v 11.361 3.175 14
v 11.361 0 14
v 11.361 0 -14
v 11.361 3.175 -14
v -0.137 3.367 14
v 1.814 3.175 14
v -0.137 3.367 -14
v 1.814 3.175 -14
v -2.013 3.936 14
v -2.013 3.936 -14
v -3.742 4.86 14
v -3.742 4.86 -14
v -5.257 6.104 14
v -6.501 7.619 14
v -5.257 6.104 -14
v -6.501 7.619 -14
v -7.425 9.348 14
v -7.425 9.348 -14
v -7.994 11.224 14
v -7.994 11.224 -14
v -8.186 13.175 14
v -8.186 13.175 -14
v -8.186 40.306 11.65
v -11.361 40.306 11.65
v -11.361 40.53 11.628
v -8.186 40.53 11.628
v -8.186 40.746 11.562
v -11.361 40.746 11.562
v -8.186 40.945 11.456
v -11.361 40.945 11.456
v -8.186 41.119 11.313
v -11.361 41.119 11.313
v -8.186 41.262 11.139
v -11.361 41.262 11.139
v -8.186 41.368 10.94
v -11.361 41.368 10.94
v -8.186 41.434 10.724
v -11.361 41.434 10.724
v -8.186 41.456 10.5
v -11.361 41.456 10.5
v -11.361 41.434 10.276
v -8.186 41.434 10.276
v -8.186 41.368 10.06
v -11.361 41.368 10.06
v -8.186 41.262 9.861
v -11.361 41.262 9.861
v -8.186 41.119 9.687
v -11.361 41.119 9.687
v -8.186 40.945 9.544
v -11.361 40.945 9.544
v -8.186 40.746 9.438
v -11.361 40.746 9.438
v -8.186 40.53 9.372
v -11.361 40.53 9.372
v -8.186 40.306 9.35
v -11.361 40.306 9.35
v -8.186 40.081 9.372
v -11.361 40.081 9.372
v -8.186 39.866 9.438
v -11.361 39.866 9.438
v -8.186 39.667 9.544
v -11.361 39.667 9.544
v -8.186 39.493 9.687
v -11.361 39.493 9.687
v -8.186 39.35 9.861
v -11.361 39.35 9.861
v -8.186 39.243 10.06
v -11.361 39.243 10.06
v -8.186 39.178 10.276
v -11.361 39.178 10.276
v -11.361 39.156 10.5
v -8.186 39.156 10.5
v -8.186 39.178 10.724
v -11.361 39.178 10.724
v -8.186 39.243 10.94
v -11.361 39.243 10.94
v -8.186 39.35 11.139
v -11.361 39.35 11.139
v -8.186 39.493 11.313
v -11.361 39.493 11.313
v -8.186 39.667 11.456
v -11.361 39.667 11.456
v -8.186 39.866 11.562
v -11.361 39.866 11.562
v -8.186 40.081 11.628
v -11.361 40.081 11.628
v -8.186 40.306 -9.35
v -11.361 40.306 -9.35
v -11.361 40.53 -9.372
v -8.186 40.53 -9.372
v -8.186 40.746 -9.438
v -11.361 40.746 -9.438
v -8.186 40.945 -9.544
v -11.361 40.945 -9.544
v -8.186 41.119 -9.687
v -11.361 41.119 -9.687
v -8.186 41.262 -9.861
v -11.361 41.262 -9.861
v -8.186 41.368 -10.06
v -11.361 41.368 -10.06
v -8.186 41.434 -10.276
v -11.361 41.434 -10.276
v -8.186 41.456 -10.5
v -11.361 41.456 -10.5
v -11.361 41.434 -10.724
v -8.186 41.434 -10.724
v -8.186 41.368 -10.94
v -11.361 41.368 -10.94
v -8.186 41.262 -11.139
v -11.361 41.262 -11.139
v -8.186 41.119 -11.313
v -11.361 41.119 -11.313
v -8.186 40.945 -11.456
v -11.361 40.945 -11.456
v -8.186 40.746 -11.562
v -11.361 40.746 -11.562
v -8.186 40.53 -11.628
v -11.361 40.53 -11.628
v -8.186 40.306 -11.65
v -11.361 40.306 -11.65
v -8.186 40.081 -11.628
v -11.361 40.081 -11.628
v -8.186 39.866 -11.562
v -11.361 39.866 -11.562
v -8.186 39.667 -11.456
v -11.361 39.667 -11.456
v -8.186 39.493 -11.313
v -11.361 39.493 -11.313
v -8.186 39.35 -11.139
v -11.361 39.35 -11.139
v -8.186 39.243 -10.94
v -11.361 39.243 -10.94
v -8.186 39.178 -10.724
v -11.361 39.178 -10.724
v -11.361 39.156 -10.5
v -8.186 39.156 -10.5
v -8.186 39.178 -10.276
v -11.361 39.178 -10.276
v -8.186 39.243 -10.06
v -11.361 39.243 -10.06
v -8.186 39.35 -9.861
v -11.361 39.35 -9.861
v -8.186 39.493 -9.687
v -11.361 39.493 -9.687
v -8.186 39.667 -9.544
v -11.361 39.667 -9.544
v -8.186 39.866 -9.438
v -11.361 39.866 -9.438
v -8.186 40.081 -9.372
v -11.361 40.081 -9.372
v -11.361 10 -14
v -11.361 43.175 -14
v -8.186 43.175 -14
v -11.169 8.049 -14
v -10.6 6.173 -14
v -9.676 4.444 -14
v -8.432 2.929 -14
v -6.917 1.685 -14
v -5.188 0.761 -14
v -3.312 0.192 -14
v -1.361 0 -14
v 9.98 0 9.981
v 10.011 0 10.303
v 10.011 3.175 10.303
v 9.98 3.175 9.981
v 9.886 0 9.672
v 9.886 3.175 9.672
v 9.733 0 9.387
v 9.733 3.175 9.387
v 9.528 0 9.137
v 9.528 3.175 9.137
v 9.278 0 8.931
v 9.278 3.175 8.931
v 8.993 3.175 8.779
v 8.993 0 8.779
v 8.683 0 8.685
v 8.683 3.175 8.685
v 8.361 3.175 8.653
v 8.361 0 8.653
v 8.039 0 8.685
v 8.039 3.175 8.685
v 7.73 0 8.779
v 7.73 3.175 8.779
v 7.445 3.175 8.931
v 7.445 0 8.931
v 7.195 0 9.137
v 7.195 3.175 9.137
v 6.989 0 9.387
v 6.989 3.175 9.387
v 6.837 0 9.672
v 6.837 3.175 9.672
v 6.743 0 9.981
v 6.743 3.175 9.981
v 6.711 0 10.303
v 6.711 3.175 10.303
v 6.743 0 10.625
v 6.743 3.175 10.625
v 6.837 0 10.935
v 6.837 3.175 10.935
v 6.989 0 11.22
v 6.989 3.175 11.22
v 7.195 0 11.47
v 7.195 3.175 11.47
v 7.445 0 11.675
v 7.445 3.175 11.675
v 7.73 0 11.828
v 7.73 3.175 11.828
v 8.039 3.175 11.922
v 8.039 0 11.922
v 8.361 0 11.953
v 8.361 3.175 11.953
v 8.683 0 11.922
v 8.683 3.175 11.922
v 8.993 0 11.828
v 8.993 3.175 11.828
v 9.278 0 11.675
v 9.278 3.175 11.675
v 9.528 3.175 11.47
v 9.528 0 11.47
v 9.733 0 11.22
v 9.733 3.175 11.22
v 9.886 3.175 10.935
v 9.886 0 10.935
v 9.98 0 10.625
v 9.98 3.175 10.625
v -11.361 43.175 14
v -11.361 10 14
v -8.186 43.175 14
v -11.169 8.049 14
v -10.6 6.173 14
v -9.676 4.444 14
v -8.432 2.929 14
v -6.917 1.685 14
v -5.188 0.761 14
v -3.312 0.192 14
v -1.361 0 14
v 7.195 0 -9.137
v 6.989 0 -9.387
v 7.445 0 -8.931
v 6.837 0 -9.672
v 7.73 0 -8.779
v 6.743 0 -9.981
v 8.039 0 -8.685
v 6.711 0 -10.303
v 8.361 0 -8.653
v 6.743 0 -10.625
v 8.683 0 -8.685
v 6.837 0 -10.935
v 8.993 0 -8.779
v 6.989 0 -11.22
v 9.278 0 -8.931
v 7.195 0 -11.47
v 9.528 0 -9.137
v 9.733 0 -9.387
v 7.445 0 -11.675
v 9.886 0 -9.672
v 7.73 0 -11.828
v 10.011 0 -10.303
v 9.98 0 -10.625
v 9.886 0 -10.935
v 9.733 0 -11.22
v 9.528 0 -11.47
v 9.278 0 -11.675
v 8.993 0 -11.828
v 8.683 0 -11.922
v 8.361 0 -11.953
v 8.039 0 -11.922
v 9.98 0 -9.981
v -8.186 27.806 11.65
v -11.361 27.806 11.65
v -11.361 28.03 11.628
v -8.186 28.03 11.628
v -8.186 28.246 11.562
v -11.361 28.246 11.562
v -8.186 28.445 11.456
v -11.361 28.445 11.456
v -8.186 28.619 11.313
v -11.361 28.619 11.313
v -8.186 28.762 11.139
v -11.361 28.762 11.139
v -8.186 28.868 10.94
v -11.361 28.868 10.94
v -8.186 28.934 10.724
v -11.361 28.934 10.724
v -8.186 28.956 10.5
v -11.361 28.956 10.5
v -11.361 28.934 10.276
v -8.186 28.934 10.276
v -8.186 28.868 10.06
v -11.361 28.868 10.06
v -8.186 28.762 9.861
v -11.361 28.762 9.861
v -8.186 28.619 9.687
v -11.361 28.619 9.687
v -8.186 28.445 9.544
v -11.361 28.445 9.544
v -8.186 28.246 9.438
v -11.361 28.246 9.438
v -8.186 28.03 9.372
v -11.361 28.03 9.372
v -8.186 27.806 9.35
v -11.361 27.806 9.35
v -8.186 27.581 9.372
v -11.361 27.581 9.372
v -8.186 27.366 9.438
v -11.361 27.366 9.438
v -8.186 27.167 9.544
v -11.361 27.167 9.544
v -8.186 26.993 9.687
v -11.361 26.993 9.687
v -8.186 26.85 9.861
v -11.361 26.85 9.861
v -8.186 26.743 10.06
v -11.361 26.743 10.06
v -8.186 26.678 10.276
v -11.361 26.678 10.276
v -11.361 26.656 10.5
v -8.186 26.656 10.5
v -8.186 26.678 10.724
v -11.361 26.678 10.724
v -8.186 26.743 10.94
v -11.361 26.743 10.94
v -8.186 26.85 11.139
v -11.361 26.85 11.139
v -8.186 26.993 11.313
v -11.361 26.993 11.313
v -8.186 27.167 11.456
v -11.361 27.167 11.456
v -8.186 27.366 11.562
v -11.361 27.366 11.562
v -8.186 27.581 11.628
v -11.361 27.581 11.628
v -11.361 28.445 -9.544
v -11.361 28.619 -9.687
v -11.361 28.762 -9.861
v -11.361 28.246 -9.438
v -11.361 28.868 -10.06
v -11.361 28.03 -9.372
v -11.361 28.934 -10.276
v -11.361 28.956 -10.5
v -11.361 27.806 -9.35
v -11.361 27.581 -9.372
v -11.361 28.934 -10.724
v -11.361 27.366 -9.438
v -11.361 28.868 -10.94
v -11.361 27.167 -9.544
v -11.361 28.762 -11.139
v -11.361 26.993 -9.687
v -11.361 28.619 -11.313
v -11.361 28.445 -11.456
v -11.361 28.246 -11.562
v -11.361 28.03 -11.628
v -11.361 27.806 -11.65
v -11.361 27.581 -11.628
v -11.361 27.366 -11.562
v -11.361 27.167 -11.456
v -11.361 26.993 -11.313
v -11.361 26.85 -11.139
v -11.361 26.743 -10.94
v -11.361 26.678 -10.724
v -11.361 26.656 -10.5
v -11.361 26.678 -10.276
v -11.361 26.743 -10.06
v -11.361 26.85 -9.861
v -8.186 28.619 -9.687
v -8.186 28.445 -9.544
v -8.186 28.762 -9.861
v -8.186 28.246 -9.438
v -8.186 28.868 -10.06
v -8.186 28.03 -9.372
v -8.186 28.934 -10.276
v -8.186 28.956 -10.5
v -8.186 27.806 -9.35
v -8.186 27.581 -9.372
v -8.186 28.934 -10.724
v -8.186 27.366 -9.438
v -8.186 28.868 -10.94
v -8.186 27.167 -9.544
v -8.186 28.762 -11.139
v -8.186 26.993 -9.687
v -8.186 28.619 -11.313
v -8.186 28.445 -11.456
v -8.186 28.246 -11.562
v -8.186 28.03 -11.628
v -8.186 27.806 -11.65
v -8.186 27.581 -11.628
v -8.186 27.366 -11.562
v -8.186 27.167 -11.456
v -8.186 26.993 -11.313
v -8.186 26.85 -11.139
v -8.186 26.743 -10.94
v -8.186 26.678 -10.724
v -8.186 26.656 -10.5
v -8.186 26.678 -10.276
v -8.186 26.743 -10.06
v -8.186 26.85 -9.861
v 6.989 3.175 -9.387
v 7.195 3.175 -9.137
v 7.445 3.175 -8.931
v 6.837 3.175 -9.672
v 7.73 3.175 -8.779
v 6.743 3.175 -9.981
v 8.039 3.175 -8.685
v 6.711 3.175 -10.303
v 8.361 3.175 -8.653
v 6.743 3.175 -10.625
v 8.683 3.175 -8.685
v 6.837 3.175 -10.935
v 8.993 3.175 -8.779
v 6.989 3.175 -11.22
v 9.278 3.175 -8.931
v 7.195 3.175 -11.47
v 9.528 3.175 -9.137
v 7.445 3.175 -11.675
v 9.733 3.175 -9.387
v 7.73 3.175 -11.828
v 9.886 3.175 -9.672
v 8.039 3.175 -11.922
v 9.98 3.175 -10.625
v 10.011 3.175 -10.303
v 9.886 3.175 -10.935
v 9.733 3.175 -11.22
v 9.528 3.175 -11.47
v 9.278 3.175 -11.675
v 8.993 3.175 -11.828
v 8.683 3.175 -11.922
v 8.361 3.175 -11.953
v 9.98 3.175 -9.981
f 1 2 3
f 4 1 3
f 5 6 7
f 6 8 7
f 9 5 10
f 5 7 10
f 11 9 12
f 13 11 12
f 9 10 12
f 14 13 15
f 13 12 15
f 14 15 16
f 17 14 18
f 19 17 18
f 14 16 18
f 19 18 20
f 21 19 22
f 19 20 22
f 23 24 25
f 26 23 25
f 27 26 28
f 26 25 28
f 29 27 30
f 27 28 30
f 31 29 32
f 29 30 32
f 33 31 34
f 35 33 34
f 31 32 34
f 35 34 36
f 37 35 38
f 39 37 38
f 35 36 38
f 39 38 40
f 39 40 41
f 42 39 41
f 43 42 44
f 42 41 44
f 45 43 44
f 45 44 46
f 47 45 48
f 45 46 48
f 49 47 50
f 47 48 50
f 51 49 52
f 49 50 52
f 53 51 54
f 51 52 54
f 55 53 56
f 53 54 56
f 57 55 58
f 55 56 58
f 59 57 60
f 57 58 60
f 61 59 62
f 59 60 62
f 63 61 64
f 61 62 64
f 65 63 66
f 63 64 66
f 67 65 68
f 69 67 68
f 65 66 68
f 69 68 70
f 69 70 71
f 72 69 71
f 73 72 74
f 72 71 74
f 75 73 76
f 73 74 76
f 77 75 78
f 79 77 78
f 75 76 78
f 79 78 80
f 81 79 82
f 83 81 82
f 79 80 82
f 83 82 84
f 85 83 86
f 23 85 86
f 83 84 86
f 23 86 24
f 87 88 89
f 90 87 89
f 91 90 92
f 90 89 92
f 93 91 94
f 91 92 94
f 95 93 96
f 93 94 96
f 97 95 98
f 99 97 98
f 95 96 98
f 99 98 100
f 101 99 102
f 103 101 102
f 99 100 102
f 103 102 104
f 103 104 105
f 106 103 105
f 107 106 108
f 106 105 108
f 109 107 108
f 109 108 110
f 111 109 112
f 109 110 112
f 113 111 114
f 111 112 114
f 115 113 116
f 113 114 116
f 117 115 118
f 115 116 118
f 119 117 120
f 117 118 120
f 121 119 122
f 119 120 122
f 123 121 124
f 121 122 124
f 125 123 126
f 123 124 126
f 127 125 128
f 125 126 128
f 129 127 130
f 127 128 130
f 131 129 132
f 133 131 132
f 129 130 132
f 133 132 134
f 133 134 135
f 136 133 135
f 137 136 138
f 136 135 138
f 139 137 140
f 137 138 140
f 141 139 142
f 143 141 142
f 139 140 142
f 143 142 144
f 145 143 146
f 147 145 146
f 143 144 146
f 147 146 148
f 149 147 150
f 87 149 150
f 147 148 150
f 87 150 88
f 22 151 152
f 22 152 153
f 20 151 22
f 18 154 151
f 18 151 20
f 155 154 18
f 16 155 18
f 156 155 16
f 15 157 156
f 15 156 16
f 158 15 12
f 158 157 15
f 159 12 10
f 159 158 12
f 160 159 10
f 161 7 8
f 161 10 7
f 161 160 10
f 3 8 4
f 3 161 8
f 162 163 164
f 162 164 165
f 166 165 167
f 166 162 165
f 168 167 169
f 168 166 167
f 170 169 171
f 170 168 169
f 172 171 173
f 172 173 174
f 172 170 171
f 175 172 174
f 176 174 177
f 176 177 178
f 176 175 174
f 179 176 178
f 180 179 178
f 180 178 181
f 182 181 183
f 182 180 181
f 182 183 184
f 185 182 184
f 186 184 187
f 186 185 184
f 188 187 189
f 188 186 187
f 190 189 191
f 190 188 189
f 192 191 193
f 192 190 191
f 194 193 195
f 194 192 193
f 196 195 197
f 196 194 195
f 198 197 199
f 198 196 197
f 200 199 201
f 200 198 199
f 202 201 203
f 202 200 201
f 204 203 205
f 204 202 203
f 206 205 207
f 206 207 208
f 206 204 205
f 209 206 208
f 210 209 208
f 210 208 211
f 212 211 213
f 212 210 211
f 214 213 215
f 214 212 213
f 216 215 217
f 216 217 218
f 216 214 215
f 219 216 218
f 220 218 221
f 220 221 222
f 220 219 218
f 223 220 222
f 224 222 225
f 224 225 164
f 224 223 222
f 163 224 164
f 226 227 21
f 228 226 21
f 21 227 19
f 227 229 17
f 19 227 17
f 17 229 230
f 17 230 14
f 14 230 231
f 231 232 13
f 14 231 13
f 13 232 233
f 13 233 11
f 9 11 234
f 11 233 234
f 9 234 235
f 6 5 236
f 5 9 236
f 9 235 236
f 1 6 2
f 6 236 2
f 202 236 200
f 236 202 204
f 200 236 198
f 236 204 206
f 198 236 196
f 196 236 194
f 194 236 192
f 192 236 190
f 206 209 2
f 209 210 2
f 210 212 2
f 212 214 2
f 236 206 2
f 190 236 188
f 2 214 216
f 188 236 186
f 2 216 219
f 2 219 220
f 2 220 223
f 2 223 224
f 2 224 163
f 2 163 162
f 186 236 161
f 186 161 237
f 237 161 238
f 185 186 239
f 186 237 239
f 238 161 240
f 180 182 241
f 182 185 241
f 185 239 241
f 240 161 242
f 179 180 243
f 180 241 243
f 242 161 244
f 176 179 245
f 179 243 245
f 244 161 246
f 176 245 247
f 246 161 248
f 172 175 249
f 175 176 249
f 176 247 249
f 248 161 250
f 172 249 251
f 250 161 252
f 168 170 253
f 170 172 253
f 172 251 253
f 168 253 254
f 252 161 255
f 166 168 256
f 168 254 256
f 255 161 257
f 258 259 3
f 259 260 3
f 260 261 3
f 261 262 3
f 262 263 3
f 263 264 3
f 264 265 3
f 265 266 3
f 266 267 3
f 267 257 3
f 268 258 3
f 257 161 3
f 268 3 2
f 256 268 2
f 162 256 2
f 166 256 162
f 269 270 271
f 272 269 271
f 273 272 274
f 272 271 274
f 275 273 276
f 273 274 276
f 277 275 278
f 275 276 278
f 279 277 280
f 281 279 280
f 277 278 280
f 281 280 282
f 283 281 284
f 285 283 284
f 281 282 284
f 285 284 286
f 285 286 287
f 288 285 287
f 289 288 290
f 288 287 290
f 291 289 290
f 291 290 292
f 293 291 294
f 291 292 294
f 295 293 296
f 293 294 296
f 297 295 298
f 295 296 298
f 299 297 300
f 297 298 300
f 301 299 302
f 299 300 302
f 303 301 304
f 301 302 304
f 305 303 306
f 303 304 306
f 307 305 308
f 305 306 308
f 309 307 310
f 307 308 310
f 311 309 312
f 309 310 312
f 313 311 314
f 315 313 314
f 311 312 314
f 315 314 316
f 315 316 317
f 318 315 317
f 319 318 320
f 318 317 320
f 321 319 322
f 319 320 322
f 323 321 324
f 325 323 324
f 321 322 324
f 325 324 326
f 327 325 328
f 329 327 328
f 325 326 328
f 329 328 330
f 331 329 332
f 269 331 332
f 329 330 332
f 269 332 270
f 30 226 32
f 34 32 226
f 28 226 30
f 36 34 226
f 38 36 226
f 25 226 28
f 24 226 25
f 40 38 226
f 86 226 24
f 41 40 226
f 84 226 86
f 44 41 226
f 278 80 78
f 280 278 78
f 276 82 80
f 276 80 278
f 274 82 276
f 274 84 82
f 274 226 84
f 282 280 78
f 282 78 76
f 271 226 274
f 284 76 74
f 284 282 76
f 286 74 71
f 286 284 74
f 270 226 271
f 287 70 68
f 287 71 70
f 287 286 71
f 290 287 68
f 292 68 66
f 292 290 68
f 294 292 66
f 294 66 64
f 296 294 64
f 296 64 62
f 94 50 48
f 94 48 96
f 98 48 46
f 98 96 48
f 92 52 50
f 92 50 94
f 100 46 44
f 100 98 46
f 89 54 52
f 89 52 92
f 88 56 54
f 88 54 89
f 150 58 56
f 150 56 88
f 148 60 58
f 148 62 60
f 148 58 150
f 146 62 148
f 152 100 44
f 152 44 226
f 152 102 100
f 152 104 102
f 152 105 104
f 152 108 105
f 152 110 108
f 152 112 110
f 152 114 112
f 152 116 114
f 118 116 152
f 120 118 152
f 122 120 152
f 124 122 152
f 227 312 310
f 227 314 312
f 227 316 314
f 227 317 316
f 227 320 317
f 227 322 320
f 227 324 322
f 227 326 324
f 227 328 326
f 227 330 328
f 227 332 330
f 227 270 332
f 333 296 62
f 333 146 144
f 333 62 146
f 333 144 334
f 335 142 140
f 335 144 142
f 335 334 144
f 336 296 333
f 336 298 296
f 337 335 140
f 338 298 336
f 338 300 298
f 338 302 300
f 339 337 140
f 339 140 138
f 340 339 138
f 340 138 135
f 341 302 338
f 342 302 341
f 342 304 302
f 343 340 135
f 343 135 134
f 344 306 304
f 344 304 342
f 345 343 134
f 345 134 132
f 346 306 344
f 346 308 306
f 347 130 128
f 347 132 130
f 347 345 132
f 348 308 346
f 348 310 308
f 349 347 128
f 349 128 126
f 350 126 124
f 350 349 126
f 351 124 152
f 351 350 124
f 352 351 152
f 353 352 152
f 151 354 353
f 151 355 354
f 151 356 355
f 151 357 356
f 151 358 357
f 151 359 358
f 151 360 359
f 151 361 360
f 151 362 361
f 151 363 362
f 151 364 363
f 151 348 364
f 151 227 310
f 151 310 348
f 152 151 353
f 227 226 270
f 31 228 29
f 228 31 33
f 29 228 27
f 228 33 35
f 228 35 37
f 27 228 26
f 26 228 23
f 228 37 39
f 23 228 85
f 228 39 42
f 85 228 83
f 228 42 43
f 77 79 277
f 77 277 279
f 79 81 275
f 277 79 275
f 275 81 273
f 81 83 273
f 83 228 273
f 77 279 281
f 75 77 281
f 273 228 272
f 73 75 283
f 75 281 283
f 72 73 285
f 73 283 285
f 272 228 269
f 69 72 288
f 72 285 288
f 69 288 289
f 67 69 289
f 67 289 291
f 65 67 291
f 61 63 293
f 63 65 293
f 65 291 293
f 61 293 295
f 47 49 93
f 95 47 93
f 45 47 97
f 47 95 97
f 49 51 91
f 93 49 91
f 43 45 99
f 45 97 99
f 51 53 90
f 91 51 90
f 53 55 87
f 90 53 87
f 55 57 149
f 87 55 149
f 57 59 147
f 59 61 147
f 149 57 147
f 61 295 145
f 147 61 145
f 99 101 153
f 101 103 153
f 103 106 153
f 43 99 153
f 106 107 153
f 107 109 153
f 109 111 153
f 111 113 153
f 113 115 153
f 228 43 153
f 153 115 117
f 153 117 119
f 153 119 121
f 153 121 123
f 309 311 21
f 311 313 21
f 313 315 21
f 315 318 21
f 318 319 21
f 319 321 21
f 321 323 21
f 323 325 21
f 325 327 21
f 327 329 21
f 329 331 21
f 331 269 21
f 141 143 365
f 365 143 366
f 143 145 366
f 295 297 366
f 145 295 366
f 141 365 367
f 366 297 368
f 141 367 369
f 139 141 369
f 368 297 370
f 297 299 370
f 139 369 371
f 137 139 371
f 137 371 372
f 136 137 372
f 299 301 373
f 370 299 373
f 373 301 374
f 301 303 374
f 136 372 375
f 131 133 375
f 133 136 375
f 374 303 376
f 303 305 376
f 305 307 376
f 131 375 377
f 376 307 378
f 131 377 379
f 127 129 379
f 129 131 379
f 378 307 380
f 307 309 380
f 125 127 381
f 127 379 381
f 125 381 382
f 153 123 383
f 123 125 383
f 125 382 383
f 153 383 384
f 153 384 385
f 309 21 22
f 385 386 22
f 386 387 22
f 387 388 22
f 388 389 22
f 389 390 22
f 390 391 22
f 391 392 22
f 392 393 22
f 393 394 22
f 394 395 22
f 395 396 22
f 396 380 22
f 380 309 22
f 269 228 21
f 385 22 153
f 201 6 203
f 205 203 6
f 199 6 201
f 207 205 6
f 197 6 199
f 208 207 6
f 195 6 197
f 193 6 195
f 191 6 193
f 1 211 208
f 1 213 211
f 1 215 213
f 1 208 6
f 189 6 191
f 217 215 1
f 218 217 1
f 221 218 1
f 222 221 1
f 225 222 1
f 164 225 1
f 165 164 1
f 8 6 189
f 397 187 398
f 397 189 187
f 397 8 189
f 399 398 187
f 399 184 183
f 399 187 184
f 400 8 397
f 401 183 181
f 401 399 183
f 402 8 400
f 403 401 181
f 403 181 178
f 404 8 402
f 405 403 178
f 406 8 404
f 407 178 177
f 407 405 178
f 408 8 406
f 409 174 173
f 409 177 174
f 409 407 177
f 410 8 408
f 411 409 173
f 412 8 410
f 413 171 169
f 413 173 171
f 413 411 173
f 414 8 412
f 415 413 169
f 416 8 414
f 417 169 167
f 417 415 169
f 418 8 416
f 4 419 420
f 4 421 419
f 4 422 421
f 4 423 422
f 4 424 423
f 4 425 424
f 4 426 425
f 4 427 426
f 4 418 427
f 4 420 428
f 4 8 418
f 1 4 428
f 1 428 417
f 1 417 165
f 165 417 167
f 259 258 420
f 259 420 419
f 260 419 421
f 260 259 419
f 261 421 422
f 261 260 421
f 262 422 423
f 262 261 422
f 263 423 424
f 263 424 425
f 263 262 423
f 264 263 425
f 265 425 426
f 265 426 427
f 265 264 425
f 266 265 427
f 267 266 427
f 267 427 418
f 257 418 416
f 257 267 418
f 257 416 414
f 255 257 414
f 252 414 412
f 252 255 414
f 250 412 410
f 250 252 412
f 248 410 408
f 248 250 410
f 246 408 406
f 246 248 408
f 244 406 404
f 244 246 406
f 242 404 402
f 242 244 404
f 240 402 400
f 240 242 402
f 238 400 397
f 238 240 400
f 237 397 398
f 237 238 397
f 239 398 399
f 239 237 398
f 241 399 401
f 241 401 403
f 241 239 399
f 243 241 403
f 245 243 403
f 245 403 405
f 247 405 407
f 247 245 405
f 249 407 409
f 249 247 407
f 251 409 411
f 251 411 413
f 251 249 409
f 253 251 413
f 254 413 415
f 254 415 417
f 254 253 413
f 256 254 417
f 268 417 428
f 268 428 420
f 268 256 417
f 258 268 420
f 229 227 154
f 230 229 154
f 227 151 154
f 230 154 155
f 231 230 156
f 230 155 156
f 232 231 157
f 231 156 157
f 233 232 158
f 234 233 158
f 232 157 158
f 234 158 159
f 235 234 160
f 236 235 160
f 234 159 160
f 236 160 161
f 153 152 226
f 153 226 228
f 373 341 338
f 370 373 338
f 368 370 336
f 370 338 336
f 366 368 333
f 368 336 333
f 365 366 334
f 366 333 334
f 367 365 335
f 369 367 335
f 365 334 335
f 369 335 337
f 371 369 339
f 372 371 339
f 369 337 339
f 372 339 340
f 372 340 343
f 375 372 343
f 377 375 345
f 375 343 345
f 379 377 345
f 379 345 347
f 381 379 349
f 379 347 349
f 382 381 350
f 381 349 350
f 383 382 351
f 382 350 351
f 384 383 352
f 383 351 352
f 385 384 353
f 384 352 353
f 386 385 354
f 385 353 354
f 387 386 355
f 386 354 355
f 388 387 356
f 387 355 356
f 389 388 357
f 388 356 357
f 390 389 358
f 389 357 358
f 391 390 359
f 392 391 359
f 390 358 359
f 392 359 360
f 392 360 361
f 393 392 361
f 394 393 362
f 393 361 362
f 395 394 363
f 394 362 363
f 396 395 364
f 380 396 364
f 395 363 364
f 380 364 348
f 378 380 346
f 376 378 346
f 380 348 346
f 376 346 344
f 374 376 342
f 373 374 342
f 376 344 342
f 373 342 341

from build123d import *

# Parameters (mm, degrees)
SKETCH1_W           = 22.722789772
SKETCH1_H           = 28
SKETCH1_R           = 1.65
BOSS_EXTRUDE1_DEPTH = 3.175
SKETCH2_W           = 3.175
SKETCH2_H           = 28
BOSS_EXTRUDE2_DEPTH = 40
FILLET1_R           = 10
SKETCH3_R           = 1.15
CUT_EXTRUDE1_DEPTH  = 3.175


with BuildPart() as part:
    # Sketch1 → Boss-Extrude1 (new body)
    with BuildSketch(Plane(origin=(0, 0, 0), x_dir=(1, 0, 0), z_dir=(0, 1, 0))):
        Rectangle(SKETCH1_W, SKETCH1_H)
        with Locations((8.361394886, 10.30327082)):
            Circle(SKETCH1_R, mode=Mode.SUBTRACT)
        with Locations((8.361394886, -10.30327082)):
            Circle(SKETCH1_R, mode=Mode.SUBTRACT)
    extrude(amount=BOSS_EXTRUDE1_DEPTH)

    # Sketch2 → Boss-Extrude2 (add)
    with BuildSketch(Plane(origin=(0, 3.175, 0), x_dir=(1, 0, 0), z_dir=(0, 1, 0))):
        with Locations((-9.773894886, 0)):
            Rectangle(SKETCH2_W, SKETCH2_H)
    extrude(amount=BOSS_EXTRUDE2_DEPTH)

    # Fillet1
    fillet1_edges = [part.edges().sort_by_distance(p)[0] for p in [
        (-8.186394886, 3.175, 0),
        (-11.361394886, 0, 0),
    ]]
    fillet(fillet1_edges, radius=FILLET1_R)

    # Sketch3 → Cut-Extrude1 (cut)
    with BuildSketch(Plane.ZY.offset(11.361394886)):
        with Locations((10.5, 40.305754395)):
            Circle(SKETCH3_R)
        with Locations((10.5, 27.805754395)):
            Circle(SKETCH3_R)
        with Locations((-10.5, 40.305754395)):
            Circle(SKETCH3_R)
        with Locations((-10.5, 27.805754395)):
            Circle(SKETCH3_R)
    extrude(amount=-CUT_EXTRUDE1_DEPTH, mode=Mode.SUBTRACT)


solid = part.part
